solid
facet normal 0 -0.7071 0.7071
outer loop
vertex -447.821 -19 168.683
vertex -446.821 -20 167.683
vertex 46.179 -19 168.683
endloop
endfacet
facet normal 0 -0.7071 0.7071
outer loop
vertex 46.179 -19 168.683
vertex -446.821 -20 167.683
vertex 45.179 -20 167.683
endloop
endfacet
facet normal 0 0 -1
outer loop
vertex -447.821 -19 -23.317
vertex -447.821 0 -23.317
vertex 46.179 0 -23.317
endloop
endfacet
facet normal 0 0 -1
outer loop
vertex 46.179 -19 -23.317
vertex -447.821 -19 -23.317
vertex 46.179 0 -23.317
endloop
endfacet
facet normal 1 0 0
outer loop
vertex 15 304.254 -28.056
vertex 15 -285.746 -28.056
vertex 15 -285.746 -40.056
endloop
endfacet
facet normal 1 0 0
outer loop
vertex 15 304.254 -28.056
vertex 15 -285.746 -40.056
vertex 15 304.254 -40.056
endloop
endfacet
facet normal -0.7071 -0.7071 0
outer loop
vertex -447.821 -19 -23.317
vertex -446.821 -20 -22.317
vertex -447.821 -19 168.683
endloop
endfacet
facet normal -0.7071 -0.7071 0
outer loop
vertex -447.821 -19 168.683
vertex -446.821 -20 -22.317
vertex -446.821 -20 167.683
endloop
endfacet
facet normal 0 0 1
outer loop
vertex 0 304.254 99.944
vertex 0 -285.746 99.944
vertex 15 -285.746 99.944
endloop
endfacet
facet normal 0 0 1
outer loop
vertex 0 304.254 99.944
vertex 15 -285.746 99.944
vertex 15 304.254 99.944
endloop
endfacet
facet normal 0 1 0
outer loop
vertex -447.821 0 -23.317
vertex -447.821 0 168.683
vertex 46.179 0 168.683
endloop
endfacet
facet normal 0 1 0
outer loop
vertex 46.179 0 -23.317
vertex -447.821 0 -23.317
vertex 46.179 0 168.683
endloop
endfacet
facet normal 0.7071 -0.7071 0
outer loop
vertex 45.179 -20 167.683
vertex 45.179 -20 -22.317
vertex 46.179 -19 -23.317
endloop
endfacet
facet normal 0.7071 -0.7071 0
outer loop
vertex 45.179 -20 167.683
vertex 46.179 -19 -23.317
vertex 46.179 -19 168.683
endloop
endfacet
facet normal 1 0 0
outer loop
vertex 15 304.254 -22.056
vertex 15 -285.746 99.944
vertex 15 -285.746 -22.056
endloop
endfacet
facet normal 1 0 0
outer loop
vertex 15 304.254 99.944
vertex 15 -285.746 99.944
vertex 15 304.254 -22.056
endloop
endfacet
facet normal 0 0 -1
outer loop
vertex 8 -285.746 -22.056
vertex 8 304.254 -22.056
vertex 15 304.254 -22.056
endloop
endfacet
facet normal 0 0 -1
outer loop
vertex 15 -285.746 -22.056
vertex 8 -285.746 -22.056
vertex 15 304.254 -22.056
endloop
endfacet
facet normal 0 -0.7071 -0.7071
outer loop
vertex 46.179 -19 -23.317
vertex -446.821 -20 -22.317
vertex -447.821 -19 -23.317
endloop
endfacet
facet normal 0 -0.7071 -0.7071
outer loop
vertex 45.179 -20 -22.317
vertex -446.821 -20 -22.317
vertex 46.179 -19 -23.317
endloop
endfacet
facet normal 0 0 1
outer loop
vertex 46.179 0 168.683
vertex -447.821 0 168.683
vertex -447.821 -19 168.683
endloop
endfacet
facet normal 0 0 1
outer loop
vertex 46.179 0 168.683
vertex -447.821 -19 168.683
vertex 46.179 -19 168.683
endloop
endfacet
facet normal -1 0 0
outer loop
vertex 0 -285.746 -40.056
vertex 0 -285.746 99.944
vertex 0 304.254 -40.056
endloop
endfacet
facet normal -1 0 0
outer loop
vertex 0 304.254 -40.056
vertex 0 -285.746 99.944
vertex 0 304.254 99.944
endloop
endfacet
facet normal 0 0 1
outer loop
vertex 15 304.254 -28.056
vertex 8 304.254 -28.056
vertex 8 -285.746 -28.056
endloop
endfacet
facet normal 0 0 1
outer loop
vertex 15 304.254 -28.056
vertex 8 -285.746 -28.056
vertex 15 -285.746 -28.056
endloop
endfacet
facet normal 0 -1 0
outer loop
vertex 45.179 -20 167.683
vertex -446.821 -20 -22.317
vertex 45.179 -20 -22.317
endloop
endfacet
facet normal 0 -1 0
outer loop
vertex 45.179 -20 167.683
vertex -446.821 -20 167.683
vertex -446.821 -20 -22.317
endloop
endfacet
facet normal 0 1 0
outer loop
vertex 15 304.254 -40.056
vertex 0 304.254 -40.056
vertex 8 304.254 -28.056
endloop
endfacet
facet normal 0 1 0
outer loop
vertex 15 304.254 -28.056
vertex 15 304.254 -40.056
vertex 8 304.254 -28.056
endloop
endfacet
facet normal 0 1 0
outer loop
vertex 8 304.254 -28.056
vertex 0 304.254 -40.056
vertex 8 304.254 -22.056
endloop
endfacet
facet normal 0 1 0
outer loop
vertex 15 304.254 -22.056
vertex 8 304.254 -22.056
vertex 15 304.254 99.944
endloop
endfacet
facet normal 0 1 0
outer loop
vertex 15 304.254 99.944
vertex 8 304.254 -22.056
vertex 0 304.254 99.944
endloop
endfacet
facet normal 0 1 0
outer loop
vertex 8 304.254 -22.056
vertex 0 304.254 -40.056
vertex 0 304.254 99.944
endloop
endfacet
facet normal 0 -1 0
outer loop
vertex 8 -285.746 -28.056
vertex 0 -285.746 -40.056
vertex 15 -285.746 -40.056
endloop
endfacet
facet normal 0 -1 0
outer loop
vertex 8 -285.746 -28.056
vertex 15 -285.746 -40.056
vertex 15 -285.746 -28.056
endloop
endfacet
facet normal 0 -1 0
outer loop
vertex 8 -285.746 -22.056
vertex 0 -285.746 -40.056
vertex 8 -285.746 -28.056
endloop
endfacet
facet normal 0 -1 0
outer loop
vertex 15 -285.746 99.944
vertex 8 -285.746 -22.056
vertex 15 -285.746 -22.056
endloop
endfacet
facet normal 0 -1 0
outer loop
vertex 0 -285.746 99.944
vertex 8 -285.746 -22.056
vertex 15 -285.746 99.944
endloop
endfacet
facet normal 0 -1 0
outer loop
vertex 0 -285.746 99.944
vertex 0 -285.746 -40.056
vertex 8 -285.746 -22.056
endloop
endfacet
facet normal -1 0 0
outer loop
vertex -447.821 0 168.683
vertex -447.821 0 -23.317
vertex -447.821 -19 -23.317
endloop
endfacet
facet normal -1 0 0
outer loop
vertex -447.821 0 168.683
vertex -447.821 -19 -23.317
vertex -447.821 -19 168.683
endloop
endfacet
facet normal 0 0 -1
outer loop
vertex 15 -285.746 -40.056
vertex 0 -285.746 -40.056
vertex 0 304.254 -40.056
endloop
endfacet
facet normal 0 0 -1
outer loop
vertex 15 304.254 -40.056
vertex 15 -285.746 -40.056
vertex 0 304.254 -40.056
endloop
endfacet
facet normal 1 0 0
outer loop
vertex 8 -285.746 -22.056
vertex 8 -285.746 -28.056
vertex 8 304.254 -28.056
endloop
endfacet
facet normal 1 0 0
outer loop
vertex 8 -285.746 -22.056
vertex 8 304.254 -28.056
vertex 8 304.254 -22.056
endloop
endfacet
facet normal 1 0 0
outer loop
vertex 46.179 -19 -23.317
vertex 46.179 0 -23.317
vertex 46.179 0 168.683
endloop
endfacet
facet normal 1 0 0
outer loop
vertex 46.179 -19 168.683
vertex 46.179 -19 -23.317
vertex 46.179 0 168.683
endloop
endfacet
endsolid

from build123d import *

# Parameters (mm, degrees)
F0_W     = 494
F0_H     = 192
F1_DEPTH = 20
F2_SIZE  = 1
F3_W     = 590
F3_H     = 140
F4_DEPTH = 15
F5_W     = 15
F5_H     = 6
F6_DEPTH = 800


with BuildPart() as f1:
    # F0 (on Front) → F1 (new body)
    with BuildSketch(Plane.XZ):
        with Locations((-200.8205638528, 72.6834676266)):
            Rectangle(F0_W, F0_H)
    extrude(amount=F1_DEPTH)

    # F2
    f2_edges = [f1.edges().sort_by_distance(p)[0] for p in [
        (-200.820564, -20, -23.316532),
        (46.179436, -20, 72.683468),
        (-200.820564, -20, 168.683468),
        (-447.820564, -20, 72.683468),
    ]]
    chamfer(f2_edges, length=F2_SIZE)


with BuildPart() as f4:
    # F3 (on Right) → F4 (new body)
    with BuildSketch(Plane.YZ):
        with Locations((9.2540290207, 29.9439153292)):
            Rectangle(F3_W, F3_H)
    extrude(amount=F4_DEPTH)

    # F5 (on face) → F6 (cut)
    with BuildSketch(Plane.XZ.offset(285.7459709793)):
        with Locations((15.5, -25.0560846708)):
            Rectangle(F5_W, F5_H)
    extrude(amount=-F6_DEPTH, mode=Mode.SUBTRACT)


solid = Compound([f1.part, f4.part])
